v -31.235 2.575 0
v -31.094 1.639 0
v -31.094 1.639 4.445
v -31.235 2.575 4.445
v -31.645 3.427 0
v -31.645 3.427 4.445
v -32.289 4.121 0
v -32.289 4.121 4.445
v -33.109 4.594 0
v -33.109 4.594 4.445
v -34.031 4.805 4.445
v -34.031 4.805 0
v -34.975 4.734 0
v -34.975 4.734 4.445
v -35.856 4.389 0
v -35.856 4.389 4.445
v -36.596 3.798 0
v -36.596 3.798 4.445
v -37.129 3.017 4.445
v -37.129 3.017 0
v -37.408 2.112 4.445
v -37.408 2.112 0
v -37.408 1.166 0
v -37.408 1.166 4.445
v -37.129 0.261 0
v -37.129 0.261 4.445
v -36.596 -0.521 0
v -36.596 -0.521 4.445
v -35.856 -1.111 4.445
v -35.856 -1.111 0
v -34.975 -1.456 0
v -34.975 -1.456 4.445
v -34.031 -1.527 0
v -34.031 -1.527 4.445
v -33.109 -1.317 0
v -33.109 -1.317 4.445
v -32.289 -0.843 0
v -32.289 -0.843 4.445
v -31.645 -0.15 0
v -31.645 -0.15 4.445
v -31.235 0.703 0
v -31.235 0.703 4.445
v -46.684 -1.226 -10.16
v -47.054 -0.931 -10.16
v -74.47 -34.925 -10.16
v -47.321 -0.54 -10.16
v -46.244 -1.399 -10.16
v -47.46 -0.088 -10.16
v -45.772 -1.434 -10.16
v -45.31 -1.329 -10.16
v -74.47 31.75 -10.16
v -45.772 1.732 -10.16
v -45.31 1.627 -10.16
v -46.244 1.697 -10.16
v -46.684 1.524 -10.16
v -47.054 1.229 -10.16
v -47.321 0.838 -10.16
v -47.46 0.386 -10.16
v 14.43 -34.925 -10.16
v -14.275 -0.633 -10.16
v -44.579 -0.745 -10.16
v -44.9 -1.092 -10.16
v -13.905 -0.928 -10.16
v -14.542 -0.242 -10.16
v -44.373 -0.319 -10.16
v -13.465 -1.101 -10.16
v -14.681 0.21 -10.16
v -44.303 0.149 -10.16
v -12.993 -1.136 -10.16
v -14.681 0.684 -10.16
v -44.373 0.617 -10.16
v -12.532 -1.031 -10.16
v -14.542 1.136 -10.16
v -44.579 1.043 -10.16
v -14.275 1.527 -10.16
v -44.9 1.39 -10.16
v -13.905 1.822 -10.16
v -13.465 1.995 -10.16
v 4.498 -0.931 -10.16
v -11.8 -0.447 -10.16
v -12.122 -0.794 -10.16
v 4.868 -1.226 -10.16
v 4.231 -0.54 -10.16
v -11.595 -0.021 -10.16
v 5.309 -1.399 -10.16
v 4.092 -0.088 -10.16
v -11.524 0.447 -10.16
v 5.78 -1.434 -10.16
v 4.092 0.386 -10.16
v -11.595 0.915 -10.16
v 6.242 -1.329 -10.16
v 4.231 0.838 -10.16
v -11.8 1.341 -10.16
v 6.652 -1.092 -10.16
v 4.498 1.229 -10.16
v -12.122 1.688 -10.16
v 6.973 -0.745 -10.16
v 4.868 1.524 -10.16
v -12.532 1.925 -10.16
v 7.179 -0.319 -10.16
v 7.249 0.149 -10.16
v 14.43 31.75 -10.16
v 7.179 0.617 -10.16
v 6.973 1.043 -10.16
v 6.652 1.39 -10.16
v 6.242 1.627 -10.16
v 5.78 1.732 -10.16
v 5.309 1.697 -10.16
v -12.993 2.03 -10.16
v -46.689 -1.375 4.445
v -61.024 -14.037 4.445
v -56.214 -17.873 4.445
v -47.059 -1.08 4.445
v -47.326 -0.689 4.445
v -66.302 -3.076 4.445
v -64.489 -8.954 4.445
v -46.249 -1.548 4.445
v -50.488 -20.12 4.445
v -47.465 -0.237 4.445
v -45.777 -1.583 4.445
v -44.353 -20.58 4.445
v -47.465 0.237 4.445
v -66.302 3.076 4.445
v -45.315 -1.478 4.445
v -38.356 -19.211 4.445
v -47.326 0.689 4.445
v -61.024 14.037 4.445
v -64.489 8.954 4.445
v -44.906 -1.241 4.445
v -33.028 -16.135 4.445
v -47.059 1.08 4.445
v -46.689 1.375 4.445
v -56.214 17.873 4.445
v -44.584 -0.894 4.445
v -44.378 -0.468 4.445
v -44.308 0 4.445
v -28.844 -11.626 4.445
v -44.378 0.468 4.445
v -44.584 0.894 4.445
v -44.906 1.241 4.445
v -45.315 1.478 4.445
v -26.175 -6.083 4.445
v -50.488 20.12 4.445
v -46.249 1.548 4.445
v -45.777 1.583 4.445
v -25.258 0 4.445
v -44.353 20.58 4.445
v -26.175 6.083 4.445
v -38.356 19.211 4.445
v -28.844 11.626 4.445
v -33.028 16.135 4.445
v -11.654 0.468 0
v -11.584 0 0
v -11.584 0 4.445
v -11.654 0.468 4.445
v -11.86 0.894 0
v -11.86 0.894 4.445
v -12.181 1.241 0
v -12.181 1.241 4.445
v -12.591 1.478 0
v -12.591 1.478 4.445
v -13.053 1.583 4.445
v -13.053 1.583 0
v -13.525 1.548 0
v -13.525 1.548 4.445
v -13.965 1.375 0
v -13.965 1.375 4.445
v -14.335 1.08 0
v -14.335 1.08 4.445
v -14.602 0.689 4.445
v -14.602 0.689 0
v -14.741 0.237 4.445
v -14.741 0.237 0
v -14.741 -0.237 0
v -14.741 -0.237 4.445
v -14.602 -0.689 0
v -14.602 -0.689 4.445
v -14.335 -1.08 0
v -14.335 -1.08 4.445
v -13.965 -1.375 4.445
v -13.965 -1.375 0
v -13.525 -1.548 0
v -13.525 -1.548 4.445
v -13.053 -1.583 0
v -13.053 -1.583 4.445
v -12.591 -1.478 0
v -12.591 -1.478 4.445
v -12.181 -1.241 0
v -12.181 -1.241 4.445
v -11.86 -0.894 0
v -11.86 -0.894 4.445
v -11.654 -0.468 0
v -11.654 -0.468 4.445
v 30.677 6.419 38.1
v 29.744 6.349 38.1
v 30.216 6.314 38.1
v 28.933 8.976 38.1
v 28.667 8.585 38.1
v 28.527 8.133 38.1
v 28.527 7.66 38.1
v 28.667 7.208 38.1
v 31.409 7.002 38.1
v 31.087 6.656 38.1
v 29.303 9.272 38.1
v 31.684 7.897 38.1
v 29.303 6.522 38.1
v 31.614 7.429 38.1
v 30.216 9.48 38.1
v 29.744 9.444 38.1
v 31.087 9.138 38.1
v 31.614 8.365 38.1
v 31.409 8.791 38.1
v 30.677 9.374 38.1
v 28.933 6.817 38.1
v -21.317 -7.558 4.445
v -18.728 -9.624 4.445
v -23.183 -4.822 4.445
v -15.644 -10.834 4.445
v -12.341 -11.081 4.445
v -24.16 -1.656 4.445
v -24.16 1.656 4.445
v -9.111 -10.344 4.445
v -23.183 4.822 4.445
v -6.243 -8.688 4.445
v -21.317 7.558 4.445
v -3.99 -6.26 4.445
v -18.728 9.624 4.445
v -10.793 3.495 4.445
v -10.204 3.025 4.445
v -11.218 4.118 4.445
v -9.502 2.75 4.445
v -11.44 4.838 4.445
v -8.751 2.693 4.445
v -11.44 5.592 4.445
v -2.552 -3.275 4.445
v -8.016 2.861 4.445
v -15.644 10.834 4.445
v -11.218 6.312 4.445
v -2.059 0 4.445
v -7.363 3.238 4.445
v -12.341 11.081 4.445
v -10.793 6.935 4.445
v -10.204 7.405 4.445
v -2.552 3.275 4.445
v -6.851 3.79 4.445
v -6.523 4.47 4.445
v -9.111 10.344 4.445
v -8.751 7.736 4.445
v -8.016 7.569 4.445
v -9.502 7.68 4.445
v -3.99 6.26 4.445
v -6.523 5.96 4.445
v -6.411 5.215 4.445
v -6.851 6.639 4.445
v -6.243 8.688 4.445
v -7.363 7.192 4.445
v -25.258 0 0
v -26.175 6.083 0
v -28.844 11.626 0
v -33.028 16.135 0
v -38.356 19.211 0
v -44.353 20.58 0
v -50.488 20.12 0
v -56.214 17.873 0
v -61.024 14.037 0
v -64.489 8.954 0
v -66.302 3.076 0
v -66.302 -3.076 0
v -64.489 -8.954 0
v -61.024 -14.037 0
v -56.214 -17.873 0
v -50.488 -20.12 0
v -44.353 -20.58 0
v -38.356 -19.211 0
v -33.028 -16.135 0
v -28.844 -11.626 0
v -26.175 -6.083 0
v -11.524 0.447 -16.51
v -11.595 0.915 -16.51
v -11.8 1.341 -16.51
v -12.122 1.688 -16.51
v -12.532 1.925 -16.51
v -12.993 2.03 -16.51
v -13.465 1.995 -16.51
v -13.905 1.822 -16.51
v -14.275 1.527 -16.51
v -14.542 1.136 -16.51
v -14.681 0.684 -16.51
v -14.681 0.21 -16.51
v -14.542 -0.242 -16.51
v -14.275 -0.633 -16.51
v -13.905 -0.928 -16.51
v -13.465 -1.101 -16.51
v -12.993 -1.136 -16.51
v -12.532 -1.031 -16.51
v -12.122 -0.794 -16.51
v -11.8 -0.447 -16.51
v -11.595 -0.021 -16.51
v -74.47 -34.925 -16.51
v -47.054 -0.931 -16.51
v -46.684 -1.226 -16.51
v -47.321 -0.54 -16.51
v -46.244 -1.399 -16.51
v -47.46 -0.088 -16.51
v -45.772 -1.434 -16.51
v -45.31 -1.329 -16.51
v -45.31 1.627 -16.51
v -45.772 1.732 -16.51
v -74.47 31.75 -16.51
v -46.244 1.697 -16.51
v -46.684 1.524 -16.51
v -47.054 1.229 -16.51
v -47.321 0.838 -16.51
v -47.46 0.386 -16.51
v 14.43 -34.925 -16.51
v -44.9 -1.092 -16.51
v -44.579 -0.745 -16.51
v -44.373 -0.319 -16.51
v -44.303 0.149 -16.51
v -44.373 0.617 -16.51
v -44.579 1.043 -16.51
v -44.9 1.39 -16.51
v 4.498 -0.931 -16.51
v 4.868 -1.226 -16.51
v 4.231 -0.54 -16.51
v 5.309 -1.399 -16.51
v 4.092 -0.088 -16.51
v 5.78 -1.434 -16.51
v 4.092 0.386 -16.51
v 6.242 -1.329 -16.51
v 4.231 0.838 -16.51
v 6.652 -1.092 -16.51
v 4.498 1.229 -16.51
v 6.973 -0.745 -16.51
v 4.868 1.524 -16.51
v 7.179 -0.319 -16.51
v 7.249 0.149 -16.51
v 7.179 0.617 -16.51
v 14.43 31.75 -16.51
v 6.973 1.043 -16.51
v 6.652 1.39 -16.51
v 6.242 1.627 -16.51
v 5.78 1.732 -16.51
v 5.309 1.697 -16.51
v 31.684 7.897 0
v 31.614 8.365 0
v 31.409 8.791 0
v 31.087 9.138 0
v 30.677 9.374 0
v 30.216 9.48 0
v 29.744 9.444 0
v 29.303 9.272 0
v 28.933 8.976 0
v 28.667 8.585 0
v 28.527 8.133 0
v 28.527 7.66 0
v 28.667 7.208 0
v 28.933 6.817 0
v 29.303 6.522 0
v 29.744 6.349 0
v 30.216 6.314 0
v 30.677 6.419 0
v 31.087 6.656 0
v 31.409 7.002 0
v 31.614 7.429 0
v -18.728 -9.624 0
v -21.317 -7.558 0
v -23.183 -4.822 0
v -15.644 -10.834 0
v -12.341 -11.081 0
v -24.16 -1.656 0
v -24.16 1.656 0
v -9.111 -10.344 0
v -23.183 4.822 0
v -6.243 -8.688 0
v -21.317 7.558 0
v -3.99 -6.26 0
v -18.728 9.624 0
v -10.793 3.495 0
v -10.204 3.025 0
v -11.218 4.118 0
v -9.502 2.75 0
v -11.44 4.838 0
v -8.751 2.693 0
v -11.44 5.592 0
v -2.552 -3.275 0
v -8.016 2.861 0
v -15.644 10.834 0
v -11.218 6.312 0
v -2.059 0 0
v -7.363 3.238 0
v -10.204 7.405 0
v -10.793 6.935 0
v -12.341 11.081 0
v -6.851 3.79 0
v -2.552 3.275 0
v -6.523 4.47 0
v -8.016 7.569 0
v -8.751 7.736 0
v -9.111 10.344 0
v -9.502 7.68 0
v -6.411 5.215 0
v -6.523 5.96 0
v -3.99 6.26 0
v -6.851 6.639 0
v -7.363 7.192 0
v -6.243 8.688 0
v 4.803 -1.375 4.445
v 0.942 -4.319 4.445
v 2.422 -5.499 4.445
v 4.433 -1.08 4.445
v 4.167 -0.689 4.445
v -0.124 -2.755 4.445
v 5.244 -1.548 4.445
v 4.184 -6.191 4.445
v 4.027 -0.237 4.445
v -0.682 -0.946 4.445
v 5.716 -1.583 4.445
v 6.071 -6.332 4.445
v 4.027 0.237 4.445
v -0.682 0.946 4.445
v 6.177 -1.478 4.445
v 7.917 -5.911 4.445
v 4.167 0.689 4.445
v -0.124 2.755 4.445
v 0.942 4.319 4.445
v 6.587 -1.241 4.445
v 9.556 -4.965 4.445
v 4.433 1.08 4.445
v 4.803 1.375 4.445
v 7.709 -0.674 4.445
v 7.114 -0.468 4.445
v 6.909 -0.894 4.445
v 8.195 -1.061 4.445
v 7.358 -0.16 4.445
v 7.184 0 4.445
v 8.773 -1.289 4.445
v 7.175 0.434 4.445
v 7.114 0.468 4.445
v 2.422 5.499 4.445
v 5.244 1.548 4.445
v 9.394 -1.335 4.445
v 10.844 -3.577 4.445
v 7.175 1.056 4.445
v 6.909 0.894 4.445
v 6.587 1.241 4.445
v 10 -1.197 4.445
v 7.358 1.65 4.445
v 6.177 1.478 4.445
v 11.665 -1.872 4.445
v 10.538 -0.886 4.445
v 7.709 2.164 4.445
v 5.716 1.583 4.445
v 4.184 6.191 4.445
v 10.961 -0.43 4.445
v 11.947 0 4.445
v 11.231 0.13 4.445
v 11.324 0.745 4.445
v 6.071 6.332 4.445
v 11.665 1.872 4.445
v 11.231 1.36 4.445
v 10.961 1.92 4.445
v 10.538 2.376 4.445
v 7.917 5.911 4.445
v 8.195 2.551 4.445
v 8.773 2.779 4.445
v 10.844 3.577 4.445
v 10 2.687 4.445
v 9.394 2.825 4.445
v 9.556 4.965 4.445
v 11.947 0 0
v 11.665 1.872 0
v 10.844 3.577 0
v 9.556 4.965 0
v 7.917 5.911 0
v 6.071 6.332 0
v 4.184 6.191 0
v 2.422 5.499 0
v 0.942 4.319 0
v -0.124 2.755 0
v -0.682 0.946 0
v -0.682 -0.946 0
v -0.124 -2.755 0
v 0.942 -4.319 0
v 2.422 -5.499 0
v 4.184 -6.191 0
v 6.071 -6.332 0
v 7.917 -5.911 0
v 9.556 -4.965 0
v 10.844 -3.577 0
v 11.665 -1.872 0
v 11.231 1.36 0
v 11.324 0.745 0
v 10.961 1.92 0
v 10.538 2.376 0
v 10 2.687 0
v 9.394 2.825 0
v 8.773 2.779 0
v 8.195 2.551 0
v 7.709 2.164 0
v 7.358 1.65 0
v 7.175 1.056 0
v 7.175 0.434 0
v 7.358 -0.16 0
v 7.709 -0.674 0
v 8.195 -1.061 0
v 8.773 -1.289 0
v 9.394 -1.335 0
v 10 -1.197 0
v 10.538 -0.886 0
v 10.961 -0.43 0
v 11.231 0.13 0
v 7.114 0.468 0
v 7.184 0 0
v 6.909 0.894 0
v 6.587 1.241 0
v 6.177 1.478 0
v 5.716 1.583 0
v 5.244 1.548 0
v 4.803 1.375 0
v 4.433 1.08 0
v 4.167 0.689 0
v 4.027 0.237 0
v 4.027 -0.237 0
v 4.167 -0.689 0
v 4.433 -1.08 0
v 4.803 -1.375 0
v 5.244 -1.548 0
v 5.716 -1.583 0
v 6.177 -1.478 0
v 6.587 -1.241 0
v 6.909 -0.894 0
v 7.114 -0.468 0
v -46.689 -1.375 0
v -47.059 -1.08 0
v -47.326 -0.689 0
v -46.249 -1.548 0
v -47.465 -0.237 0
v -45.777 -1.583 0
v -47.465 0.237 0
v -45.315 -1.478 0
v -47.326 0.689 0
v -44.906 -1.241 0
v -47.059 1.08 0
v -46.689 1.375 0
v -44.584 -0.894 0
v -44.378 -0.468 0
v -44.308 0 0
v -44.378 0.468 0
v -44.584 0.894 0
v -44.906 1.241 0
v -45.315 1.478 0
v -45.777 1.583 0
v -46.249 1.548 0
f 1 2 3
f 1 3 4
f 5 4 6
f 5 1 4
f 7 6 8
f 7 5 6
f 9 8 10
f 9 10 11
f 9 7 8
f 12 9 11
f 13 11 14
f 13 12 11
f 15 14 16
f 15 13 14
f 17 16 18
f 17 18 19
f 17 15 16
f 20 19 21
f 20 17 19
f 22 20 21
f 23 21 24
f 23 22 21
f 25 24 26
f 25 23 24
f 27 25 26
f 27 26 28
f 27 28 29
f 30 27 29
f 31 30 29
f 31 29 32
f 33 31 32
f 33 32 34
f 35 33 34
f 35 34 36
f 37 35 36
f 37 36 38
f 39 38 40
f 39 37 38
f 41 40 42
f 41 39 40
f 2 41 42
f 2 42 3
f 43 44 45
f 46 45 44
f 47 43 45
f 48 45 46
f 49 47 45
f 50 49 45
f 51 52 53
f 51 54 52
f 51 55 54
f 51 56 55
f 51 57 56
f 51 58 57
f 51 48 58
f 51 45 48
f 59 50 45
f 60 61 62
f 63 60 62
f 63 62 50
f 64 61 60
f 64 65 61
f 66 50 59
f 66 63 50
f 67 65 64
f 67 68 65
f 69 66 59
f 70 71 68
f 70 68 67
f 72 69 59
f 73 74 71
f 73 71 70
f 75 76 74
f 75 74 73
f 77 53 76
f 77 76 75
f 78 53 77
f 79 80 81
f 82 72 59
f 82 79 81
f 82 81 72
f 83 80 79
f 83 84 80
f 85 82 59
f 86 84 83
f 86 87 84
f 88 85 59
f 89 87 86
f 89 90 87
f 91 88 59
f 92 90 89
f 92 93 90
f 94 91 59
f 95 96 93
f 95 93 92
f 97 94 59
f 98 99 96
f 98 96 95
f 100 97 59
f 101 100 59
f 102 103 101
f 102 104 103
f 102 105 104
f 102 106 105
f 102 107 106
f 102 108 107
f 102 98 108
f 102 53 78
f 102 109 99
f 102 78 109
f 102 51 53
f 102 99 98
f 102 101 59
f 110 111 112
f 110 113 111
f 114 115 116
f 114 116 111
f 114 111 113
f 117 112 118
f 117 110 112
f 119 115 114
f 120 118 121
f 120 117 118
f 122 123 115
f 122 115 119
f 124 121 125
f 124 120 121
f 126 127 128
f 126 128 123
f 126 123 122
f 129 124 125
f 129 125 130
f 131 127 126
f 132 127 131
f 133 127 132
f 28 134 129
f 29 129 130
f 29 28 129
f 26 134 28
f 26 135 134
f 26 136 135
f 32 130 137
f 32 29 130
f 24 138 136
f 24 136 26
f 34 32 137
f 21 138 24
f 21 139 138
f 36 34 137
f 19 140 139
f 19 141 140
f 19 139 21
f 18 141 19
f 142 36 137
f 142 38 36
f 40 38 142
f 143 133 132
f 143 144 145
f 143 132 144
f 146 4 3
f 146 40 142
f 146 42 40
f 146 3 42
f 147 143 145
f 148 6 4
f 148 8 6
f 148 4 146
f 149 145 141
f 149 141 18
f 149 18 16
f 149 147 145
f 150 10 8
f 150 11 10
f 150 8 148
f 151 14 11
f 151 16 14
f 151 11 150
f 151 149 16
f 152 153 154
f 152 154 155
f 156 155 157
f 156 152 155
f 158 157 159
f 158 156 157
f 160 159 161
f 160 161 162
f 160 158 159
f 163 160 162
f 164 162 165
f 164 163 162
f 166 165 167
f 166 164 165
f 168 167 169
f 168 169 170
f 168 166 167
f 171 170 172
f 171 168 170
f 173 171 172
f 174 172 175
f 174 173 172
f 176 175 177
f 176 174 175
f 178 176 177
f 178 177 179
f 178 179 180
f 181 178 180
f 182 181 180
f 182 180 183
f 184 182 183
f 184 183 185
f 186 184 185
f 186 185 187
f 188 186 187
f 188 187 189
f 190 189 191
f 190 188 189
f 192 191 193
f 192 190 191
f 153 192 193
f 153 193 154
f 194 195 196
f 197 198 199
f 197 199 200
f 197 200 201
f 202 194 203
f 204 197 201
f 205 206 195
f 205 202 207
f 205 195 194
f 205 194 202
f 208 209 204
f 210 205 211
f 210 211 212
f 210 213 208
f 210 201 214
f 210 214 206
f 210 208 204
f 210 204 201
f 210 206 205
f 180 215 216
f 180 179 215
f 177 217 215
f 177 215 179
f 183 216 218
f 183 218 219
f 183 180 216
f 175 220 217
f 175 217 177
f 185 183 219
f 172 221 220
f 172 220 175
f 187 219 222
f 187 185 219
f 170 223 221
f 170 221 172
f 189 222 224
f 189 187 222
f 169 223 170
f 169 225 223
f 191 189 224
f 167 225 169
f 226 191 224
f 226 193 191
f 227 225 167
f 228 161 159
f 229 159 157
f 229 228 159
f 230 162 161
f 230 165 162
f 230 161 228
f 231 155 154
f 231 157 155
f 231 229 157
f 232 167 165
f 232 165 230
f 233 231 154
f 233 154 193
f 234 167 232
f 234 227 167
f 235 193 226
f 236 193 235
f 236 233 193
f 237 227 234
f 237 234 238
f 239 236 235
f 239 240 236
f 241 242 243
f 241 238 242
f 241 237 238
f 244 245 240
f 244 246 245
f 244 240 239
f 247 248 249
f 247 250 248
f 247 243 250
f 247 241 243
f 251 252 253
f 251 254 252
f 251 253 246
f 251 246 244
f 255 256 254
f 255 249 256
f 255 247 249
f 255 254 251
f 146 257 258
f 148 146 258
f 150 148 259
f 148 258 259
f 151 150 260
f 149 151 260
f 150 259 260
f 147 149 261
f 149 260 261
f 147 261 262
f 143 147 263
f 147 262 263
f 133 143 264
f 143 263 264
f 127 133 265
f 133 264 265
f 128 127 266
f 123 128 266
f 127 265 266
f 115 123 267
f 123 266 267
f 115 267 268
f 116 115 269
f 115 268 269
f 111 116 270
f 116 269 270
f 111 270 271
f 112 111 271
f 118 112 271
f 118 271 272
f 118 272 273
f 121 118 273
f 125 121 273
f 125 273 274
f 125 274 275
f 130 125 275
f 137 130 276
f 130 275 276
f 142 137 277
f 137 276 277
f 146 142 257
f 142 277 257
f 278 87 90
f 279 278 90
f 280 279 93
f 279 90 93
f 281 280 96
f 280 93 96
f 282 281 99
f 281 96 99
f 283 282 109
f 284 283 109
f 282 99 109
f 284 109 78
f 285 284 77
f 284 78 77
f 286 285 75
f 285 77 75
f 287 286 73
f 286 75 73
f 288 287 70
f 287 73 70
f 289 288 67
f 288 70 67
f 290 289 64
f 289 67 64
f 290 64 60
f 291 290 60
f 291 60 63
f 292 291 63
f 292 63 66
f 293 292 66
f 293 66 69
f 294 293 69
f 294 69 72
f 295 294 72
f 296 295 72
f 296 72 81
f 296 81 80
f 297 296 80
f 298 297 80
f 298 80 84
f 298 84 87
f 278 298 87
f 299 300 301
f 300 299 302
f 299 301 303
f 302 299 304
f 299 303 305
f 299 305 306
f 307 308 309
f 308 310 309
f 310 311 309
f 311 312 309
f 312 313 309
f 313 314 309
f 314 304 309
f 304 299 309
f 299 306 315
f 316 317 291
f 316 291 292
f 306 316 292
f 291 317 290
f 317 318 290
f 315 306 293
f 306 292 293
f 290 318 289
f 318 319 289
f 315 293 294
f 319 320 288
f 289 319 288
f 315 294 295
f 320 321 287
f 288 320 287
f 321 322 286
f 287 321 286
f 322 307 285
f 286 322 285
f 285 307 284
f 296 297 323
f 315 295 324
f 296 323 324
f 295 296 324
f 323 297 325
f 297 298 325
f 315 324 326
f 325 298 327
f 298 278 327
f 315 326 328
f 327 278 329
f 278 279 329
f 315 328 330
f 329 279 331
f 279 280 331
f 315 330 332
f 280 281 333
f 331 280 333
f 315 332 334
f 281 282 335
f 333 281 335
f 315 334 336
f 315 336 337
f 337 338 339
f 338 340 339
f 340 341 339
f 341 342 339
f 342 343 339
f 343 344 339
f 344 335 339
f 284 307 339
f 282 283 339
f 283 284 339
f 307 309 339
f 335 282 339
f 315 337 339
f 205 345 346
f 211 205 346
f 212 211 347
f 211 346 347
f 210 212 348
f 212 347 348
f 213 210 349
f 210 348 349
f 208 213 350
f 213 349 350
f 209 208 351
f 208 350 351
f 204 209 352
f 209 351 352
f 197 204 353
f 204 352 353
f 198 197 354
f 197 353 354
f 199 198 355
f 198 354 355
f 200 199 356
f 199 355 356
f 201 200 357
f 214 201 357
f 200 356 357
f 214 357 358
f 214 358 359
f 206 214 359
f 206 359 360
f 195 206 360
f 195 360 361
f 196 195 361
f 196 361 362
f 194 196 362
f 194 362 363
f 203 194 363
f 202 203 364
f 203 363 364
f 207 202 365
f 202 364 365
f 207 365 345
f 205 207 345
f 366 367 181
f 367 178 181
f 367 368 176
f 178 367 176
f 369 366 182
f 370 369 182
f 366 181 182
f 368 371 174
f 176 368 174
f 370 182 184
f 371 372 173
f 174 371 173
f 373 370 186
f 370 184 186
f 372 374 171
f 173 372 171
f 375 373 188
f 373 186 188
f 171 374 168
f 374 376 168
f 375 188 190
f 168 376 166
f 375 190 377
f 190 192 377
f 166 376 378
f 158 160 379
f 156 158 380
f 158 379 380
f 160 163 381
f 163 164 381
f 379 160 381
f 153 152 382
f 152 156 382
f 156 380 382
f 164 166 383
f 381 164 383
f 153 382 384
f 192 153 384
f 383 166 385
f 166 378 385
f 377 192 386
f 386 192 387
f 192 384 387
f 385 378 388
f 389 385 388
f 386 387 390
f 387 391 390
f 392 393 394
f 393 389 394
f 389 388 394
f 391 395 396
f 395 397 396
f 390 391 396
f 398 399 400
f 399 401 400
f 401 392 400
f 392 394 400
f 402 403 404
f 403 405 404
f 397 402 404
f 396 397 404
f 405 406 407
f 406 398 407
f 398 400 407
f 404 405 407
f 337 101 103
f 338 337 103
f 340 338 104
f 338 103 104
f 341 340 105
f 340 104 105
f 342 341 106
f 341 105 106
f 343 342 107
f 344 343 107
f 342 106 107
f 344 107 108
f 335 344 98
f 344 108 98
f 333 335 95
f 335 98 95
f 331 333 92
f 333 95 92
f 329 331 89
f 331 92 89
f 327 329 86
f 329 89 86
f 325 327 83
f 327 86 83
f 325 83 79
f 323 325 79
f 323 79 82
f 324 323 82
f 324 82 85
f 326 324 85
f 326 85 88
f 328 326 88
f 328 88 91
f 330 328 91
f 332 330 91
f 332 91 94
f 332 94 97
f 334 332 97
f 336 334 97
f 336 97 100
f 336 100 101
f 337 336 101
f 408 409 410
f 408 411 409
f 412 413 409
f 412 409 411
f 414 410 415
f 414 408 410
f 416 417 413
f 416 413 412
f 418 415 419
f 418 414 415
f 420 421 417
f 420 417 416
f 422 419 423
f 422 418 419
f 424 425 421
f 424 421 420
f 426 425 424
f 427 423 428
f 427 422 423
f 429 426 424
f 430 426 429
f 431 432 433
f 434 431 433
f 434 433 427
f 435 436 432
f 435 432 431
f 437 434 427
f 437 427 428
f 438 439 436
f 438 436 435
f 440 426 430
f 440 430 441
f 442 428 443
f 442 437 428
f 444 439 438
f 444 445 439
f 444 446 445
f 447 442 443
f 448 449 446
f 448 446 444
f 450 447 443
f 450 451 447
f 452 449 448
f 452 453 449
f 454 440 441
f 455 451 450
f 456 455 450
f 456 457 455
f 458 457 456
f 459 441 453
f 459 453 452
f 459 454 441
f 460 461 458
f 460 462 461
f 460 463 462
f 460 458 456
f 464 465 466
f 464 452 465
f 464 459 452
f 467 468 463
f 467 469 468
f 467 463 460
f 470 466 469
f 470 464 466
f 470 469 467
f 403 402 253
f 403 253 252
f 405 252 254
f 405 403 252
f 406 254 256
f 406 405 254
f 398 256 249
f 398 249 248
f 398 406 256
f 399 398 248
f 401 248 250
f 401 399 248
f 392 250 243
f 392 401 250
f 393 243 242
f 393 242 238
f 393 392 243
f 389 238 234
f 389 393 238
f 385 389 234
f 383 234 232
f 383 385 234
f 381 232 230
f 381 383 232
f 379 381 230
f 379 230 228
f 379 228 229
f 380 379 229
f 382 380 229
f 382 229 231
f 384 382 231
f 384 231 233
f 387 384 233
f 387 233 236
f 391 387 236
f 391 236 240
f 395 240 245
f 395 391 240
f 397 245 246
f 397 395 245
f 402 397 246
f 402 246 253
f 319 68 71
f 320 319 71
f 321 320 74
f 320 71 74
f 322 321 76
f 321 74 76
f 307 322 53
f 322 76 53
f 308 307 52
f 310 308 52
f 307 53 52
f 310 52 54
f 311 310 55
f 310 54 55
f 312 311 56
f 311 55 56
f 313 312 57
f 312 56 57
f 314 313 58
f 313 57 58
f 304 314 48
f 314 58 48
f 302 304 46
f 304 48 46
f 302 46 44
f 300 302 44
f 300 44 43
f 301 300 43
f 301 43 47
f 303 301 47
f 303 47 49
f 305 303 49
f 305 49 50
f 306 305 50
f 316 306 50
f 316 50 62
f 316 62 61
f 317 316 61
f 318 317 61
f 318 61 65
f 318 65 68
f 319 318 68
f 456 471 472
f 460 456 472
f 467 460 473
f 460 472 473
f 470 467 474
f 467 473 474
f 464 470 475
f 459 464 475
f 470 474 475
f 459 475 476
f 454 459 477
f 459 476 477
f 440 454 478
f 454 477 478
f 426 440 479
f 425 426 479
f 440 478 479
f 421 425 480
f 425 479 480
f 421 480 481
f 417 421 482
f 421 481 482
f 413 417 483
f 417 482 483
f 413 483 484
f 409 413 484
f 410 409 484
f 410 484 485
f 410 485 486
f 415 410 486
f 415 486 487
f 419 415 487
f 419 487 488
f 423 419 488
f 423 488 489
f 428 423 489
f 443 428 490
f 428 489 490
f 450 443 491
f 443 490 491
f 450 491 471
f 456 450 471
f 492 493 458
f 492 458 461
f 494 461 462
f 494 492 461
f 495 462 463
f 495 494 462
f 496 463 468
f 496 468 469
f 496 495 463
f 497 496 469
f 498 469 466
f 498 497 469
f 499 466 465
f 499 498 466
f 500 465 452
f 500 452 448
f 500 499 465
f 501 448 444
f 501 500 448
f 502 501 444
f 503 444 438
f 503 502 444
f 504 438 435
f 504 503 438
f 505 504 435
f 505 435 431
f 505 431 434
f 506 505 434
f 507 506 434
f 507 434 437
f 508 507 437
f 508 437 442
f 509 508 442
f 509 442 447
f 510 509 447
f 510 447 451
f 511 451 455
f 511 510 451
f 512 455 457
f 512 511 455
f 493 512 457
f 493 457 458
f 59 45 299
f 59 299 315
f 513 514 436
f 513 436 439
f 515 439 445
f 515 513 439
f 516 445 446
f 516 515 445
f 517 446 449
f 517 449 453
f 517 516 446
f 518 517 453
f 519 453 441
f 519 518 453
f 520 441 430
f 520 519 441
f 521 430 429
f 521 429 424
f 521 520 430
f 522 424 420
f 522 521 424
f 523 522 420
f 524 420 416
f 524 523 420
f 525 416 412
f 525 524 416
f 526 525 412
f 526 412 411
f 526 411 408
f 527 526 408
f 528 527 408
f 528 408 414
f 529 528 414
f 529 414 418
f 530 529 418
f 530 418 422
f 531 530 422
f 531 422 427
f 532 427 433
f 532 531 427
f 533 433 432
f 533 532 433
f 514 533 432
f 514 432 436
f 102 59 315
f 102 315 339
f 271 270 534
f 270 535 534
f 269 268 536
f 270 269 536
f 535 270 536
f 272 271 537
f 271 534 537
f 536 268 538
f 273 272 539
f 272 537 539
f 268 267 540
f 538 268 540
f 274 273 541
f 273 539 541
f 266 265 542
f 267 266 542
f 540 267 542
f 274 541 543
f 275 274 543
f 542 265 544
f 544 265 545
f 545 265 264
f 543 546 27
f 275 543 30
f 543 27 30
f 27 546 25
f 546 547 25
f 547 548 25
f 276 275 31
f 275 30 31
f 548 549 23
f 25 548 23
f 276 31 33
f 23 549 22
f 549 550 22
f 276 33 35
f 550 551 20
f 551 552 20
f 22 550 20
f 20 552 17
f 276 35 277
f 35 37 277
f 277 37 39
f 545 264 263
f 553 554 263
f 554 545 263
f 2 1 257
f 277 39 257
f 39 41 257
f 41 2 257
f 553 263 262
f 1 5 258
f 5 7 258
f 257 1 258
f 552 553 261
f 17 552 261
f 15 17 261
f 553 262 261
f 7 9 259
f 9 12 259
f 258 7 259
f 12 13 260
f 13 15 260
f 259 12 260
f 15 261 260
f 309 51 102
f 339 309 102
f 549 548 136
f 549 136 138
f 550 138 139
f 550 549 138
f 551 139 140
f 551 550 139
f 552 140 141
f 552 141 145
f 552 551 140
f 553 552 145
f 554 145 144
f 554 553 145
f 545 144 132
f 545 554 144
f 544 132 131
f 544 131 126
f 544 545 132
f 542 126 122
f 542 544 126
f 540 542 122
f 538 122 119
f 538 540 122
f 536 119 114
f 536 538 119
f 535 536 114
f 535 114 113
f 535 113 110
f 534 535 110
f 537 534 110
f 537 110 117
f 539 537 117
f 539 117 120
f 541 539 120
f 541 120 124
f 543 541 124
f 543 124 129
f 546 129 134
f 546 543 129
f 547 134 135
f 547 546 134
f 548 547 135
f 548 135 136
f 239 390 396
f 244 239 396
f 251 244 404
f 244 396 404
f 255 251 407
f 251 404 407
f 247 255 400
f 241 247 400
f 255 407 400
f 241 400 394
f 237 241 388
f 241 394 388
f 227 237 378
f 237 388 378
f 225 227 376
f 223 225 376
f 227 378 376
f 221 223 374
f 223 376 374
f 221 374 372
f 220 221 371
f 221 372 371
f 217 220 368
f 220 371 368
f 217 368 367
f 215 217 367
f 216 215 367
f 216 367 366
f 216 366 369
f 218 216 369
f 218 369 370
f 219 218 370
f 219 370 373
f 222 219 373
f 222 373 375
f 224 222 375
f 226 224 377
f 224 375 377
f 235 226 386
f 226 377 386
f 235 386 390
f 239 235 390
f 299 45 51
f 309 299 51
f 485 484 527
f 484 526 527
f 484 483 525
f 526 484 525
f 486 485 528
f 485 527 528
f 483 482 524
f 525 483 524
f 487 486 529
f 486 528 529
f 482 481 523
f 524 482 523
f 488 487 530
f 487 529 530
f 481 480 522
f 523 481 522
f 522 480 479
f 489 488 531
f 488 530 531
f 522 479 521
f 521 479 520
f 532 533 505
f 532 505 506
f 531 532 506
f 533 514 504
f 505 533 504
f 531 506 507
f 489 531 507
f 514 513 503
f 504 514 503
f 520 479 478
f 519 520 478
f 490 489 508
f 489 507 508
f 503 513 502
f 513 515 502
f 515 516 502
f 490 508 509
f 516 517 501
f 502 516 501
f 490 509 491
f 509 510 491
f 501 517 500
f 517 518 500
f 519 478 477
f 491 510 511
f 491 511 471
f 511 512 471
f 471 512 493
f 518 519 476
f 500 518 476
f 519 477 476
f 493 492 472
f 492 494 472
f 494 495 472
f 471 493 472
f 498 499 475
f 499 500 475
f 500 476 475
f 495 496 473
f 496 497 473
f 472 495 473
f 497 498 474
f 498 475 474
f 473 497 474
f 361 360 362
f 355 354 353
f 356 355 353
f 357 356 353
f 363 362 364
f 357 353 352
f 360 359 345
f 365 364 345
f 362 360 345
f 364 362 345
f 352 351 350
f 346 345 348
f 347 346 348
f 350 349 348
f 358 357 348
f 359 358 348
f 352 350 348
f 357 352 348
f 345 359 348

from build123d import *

# Parameters (mm, degrees)
F1_W     = 88.9
F1_H     = 66.675
F1_R     = 1.5875
F3_DEPTH = 16.51
F4_DEPTH = 10.16
F0_R     = 20.6375
F0_R_2   = 1.5875
F0_R_3   = 3.175
F0_R_4   = 11.1125
F0_R_5   = 2.528519
F0_R_6   = 6.35
F0_R_7   = 2.085922
F5_DEPTH = 4.445
F2_R     = 1.5875
F6_DEPTH = 38.1


with BuildPart() as f3:
    # F1 (on Top) → F3 (new body)
    with BuildSketch(Plane.XY):
        with Locations((-30.020347, -1.5875)):
            Rectangle(F1_W, F1_H)
        with Locations((-45.890279, 0.148994)):
            Circle(F1_R, mode=Mode.SUBTRACT)
        with Locations((-13.111511, 0.446983)):
            Circle(F1_R, mode=Mode.SUBTRACT)
        with Locations((5.661787, 0.148994)):
            Circle(F1_R, mode=Mode.SUBTRACT)
    extrude(amount=-F3_DEPTH)

    # F1 (on Top) → F4 (cut)
    with BuildSketch(Plane.XY):
        with Locations((-30.020347, -1.5875)):
            Rectangle(F1_W, F1_H)
        with Locations((-45.890279, 0.148994)):
            Circle(F1_R, mode=Mode.SUBTRACT)
        with Locations((-13.111511, 0.446983)):
            Circle(F1_R, mode=Mode.SUBTRACT)
        with Locations((5.661787, 0.148994)):
            Circle(F1_R, mode=Mode.SUBTRACT)
    extrude(amount=-F4_DEPTH, mode=Mode.SUBTRACT)


with BuildPart() as f5:
    # F0 (on Top) → F5 (new body)
    with BuildSketch(Plane.XY):
        with Locations((-45.895347, 0)):
            Circle(F0_R)
        with Locations((-45.895347, 0)):
            Circle(F0_R_2, mode=Mode.SUBTRACT)
        with Locations((-34.268714, 1.638939)):
            Circle(F0_R_3, mode=Mode.SUBTRACT)
        with Locations((-13.171278, 0)):
            Circle(F0_R_4)
        with Locations((-13.171278, 0)):
            Circle(F0_R_2, mode=Mode.SUBTRACT)
        with Locations((-8.939665, 5.214805)):
            Circle(F0_R_5, mode=Mode.SUBTRACT)
        with Locations((5.596927, 0)):
            Circle(F0_R_6)
        with Locations((5.596927, 0)):
            Circle(F0_R_2, mode=Mode.SUBTRACT)
        with Locations((9.237655, 0.744972)):
            Circle(F0_R_7, mode=Mode.SUBTRACT)
    extrude(amount=F5_DEPTH)


with BuildPart() as f6:
    # F2 (on Top) → F6 (new body)
    with BuildSketch(Plane.XY):
        with Locations((30.09687, 7.896704)):
            Circle(F2_R)
    extrude(amount=F6_DEPTH)


solid = Compound([f3.part, f5.part, f6.part])
